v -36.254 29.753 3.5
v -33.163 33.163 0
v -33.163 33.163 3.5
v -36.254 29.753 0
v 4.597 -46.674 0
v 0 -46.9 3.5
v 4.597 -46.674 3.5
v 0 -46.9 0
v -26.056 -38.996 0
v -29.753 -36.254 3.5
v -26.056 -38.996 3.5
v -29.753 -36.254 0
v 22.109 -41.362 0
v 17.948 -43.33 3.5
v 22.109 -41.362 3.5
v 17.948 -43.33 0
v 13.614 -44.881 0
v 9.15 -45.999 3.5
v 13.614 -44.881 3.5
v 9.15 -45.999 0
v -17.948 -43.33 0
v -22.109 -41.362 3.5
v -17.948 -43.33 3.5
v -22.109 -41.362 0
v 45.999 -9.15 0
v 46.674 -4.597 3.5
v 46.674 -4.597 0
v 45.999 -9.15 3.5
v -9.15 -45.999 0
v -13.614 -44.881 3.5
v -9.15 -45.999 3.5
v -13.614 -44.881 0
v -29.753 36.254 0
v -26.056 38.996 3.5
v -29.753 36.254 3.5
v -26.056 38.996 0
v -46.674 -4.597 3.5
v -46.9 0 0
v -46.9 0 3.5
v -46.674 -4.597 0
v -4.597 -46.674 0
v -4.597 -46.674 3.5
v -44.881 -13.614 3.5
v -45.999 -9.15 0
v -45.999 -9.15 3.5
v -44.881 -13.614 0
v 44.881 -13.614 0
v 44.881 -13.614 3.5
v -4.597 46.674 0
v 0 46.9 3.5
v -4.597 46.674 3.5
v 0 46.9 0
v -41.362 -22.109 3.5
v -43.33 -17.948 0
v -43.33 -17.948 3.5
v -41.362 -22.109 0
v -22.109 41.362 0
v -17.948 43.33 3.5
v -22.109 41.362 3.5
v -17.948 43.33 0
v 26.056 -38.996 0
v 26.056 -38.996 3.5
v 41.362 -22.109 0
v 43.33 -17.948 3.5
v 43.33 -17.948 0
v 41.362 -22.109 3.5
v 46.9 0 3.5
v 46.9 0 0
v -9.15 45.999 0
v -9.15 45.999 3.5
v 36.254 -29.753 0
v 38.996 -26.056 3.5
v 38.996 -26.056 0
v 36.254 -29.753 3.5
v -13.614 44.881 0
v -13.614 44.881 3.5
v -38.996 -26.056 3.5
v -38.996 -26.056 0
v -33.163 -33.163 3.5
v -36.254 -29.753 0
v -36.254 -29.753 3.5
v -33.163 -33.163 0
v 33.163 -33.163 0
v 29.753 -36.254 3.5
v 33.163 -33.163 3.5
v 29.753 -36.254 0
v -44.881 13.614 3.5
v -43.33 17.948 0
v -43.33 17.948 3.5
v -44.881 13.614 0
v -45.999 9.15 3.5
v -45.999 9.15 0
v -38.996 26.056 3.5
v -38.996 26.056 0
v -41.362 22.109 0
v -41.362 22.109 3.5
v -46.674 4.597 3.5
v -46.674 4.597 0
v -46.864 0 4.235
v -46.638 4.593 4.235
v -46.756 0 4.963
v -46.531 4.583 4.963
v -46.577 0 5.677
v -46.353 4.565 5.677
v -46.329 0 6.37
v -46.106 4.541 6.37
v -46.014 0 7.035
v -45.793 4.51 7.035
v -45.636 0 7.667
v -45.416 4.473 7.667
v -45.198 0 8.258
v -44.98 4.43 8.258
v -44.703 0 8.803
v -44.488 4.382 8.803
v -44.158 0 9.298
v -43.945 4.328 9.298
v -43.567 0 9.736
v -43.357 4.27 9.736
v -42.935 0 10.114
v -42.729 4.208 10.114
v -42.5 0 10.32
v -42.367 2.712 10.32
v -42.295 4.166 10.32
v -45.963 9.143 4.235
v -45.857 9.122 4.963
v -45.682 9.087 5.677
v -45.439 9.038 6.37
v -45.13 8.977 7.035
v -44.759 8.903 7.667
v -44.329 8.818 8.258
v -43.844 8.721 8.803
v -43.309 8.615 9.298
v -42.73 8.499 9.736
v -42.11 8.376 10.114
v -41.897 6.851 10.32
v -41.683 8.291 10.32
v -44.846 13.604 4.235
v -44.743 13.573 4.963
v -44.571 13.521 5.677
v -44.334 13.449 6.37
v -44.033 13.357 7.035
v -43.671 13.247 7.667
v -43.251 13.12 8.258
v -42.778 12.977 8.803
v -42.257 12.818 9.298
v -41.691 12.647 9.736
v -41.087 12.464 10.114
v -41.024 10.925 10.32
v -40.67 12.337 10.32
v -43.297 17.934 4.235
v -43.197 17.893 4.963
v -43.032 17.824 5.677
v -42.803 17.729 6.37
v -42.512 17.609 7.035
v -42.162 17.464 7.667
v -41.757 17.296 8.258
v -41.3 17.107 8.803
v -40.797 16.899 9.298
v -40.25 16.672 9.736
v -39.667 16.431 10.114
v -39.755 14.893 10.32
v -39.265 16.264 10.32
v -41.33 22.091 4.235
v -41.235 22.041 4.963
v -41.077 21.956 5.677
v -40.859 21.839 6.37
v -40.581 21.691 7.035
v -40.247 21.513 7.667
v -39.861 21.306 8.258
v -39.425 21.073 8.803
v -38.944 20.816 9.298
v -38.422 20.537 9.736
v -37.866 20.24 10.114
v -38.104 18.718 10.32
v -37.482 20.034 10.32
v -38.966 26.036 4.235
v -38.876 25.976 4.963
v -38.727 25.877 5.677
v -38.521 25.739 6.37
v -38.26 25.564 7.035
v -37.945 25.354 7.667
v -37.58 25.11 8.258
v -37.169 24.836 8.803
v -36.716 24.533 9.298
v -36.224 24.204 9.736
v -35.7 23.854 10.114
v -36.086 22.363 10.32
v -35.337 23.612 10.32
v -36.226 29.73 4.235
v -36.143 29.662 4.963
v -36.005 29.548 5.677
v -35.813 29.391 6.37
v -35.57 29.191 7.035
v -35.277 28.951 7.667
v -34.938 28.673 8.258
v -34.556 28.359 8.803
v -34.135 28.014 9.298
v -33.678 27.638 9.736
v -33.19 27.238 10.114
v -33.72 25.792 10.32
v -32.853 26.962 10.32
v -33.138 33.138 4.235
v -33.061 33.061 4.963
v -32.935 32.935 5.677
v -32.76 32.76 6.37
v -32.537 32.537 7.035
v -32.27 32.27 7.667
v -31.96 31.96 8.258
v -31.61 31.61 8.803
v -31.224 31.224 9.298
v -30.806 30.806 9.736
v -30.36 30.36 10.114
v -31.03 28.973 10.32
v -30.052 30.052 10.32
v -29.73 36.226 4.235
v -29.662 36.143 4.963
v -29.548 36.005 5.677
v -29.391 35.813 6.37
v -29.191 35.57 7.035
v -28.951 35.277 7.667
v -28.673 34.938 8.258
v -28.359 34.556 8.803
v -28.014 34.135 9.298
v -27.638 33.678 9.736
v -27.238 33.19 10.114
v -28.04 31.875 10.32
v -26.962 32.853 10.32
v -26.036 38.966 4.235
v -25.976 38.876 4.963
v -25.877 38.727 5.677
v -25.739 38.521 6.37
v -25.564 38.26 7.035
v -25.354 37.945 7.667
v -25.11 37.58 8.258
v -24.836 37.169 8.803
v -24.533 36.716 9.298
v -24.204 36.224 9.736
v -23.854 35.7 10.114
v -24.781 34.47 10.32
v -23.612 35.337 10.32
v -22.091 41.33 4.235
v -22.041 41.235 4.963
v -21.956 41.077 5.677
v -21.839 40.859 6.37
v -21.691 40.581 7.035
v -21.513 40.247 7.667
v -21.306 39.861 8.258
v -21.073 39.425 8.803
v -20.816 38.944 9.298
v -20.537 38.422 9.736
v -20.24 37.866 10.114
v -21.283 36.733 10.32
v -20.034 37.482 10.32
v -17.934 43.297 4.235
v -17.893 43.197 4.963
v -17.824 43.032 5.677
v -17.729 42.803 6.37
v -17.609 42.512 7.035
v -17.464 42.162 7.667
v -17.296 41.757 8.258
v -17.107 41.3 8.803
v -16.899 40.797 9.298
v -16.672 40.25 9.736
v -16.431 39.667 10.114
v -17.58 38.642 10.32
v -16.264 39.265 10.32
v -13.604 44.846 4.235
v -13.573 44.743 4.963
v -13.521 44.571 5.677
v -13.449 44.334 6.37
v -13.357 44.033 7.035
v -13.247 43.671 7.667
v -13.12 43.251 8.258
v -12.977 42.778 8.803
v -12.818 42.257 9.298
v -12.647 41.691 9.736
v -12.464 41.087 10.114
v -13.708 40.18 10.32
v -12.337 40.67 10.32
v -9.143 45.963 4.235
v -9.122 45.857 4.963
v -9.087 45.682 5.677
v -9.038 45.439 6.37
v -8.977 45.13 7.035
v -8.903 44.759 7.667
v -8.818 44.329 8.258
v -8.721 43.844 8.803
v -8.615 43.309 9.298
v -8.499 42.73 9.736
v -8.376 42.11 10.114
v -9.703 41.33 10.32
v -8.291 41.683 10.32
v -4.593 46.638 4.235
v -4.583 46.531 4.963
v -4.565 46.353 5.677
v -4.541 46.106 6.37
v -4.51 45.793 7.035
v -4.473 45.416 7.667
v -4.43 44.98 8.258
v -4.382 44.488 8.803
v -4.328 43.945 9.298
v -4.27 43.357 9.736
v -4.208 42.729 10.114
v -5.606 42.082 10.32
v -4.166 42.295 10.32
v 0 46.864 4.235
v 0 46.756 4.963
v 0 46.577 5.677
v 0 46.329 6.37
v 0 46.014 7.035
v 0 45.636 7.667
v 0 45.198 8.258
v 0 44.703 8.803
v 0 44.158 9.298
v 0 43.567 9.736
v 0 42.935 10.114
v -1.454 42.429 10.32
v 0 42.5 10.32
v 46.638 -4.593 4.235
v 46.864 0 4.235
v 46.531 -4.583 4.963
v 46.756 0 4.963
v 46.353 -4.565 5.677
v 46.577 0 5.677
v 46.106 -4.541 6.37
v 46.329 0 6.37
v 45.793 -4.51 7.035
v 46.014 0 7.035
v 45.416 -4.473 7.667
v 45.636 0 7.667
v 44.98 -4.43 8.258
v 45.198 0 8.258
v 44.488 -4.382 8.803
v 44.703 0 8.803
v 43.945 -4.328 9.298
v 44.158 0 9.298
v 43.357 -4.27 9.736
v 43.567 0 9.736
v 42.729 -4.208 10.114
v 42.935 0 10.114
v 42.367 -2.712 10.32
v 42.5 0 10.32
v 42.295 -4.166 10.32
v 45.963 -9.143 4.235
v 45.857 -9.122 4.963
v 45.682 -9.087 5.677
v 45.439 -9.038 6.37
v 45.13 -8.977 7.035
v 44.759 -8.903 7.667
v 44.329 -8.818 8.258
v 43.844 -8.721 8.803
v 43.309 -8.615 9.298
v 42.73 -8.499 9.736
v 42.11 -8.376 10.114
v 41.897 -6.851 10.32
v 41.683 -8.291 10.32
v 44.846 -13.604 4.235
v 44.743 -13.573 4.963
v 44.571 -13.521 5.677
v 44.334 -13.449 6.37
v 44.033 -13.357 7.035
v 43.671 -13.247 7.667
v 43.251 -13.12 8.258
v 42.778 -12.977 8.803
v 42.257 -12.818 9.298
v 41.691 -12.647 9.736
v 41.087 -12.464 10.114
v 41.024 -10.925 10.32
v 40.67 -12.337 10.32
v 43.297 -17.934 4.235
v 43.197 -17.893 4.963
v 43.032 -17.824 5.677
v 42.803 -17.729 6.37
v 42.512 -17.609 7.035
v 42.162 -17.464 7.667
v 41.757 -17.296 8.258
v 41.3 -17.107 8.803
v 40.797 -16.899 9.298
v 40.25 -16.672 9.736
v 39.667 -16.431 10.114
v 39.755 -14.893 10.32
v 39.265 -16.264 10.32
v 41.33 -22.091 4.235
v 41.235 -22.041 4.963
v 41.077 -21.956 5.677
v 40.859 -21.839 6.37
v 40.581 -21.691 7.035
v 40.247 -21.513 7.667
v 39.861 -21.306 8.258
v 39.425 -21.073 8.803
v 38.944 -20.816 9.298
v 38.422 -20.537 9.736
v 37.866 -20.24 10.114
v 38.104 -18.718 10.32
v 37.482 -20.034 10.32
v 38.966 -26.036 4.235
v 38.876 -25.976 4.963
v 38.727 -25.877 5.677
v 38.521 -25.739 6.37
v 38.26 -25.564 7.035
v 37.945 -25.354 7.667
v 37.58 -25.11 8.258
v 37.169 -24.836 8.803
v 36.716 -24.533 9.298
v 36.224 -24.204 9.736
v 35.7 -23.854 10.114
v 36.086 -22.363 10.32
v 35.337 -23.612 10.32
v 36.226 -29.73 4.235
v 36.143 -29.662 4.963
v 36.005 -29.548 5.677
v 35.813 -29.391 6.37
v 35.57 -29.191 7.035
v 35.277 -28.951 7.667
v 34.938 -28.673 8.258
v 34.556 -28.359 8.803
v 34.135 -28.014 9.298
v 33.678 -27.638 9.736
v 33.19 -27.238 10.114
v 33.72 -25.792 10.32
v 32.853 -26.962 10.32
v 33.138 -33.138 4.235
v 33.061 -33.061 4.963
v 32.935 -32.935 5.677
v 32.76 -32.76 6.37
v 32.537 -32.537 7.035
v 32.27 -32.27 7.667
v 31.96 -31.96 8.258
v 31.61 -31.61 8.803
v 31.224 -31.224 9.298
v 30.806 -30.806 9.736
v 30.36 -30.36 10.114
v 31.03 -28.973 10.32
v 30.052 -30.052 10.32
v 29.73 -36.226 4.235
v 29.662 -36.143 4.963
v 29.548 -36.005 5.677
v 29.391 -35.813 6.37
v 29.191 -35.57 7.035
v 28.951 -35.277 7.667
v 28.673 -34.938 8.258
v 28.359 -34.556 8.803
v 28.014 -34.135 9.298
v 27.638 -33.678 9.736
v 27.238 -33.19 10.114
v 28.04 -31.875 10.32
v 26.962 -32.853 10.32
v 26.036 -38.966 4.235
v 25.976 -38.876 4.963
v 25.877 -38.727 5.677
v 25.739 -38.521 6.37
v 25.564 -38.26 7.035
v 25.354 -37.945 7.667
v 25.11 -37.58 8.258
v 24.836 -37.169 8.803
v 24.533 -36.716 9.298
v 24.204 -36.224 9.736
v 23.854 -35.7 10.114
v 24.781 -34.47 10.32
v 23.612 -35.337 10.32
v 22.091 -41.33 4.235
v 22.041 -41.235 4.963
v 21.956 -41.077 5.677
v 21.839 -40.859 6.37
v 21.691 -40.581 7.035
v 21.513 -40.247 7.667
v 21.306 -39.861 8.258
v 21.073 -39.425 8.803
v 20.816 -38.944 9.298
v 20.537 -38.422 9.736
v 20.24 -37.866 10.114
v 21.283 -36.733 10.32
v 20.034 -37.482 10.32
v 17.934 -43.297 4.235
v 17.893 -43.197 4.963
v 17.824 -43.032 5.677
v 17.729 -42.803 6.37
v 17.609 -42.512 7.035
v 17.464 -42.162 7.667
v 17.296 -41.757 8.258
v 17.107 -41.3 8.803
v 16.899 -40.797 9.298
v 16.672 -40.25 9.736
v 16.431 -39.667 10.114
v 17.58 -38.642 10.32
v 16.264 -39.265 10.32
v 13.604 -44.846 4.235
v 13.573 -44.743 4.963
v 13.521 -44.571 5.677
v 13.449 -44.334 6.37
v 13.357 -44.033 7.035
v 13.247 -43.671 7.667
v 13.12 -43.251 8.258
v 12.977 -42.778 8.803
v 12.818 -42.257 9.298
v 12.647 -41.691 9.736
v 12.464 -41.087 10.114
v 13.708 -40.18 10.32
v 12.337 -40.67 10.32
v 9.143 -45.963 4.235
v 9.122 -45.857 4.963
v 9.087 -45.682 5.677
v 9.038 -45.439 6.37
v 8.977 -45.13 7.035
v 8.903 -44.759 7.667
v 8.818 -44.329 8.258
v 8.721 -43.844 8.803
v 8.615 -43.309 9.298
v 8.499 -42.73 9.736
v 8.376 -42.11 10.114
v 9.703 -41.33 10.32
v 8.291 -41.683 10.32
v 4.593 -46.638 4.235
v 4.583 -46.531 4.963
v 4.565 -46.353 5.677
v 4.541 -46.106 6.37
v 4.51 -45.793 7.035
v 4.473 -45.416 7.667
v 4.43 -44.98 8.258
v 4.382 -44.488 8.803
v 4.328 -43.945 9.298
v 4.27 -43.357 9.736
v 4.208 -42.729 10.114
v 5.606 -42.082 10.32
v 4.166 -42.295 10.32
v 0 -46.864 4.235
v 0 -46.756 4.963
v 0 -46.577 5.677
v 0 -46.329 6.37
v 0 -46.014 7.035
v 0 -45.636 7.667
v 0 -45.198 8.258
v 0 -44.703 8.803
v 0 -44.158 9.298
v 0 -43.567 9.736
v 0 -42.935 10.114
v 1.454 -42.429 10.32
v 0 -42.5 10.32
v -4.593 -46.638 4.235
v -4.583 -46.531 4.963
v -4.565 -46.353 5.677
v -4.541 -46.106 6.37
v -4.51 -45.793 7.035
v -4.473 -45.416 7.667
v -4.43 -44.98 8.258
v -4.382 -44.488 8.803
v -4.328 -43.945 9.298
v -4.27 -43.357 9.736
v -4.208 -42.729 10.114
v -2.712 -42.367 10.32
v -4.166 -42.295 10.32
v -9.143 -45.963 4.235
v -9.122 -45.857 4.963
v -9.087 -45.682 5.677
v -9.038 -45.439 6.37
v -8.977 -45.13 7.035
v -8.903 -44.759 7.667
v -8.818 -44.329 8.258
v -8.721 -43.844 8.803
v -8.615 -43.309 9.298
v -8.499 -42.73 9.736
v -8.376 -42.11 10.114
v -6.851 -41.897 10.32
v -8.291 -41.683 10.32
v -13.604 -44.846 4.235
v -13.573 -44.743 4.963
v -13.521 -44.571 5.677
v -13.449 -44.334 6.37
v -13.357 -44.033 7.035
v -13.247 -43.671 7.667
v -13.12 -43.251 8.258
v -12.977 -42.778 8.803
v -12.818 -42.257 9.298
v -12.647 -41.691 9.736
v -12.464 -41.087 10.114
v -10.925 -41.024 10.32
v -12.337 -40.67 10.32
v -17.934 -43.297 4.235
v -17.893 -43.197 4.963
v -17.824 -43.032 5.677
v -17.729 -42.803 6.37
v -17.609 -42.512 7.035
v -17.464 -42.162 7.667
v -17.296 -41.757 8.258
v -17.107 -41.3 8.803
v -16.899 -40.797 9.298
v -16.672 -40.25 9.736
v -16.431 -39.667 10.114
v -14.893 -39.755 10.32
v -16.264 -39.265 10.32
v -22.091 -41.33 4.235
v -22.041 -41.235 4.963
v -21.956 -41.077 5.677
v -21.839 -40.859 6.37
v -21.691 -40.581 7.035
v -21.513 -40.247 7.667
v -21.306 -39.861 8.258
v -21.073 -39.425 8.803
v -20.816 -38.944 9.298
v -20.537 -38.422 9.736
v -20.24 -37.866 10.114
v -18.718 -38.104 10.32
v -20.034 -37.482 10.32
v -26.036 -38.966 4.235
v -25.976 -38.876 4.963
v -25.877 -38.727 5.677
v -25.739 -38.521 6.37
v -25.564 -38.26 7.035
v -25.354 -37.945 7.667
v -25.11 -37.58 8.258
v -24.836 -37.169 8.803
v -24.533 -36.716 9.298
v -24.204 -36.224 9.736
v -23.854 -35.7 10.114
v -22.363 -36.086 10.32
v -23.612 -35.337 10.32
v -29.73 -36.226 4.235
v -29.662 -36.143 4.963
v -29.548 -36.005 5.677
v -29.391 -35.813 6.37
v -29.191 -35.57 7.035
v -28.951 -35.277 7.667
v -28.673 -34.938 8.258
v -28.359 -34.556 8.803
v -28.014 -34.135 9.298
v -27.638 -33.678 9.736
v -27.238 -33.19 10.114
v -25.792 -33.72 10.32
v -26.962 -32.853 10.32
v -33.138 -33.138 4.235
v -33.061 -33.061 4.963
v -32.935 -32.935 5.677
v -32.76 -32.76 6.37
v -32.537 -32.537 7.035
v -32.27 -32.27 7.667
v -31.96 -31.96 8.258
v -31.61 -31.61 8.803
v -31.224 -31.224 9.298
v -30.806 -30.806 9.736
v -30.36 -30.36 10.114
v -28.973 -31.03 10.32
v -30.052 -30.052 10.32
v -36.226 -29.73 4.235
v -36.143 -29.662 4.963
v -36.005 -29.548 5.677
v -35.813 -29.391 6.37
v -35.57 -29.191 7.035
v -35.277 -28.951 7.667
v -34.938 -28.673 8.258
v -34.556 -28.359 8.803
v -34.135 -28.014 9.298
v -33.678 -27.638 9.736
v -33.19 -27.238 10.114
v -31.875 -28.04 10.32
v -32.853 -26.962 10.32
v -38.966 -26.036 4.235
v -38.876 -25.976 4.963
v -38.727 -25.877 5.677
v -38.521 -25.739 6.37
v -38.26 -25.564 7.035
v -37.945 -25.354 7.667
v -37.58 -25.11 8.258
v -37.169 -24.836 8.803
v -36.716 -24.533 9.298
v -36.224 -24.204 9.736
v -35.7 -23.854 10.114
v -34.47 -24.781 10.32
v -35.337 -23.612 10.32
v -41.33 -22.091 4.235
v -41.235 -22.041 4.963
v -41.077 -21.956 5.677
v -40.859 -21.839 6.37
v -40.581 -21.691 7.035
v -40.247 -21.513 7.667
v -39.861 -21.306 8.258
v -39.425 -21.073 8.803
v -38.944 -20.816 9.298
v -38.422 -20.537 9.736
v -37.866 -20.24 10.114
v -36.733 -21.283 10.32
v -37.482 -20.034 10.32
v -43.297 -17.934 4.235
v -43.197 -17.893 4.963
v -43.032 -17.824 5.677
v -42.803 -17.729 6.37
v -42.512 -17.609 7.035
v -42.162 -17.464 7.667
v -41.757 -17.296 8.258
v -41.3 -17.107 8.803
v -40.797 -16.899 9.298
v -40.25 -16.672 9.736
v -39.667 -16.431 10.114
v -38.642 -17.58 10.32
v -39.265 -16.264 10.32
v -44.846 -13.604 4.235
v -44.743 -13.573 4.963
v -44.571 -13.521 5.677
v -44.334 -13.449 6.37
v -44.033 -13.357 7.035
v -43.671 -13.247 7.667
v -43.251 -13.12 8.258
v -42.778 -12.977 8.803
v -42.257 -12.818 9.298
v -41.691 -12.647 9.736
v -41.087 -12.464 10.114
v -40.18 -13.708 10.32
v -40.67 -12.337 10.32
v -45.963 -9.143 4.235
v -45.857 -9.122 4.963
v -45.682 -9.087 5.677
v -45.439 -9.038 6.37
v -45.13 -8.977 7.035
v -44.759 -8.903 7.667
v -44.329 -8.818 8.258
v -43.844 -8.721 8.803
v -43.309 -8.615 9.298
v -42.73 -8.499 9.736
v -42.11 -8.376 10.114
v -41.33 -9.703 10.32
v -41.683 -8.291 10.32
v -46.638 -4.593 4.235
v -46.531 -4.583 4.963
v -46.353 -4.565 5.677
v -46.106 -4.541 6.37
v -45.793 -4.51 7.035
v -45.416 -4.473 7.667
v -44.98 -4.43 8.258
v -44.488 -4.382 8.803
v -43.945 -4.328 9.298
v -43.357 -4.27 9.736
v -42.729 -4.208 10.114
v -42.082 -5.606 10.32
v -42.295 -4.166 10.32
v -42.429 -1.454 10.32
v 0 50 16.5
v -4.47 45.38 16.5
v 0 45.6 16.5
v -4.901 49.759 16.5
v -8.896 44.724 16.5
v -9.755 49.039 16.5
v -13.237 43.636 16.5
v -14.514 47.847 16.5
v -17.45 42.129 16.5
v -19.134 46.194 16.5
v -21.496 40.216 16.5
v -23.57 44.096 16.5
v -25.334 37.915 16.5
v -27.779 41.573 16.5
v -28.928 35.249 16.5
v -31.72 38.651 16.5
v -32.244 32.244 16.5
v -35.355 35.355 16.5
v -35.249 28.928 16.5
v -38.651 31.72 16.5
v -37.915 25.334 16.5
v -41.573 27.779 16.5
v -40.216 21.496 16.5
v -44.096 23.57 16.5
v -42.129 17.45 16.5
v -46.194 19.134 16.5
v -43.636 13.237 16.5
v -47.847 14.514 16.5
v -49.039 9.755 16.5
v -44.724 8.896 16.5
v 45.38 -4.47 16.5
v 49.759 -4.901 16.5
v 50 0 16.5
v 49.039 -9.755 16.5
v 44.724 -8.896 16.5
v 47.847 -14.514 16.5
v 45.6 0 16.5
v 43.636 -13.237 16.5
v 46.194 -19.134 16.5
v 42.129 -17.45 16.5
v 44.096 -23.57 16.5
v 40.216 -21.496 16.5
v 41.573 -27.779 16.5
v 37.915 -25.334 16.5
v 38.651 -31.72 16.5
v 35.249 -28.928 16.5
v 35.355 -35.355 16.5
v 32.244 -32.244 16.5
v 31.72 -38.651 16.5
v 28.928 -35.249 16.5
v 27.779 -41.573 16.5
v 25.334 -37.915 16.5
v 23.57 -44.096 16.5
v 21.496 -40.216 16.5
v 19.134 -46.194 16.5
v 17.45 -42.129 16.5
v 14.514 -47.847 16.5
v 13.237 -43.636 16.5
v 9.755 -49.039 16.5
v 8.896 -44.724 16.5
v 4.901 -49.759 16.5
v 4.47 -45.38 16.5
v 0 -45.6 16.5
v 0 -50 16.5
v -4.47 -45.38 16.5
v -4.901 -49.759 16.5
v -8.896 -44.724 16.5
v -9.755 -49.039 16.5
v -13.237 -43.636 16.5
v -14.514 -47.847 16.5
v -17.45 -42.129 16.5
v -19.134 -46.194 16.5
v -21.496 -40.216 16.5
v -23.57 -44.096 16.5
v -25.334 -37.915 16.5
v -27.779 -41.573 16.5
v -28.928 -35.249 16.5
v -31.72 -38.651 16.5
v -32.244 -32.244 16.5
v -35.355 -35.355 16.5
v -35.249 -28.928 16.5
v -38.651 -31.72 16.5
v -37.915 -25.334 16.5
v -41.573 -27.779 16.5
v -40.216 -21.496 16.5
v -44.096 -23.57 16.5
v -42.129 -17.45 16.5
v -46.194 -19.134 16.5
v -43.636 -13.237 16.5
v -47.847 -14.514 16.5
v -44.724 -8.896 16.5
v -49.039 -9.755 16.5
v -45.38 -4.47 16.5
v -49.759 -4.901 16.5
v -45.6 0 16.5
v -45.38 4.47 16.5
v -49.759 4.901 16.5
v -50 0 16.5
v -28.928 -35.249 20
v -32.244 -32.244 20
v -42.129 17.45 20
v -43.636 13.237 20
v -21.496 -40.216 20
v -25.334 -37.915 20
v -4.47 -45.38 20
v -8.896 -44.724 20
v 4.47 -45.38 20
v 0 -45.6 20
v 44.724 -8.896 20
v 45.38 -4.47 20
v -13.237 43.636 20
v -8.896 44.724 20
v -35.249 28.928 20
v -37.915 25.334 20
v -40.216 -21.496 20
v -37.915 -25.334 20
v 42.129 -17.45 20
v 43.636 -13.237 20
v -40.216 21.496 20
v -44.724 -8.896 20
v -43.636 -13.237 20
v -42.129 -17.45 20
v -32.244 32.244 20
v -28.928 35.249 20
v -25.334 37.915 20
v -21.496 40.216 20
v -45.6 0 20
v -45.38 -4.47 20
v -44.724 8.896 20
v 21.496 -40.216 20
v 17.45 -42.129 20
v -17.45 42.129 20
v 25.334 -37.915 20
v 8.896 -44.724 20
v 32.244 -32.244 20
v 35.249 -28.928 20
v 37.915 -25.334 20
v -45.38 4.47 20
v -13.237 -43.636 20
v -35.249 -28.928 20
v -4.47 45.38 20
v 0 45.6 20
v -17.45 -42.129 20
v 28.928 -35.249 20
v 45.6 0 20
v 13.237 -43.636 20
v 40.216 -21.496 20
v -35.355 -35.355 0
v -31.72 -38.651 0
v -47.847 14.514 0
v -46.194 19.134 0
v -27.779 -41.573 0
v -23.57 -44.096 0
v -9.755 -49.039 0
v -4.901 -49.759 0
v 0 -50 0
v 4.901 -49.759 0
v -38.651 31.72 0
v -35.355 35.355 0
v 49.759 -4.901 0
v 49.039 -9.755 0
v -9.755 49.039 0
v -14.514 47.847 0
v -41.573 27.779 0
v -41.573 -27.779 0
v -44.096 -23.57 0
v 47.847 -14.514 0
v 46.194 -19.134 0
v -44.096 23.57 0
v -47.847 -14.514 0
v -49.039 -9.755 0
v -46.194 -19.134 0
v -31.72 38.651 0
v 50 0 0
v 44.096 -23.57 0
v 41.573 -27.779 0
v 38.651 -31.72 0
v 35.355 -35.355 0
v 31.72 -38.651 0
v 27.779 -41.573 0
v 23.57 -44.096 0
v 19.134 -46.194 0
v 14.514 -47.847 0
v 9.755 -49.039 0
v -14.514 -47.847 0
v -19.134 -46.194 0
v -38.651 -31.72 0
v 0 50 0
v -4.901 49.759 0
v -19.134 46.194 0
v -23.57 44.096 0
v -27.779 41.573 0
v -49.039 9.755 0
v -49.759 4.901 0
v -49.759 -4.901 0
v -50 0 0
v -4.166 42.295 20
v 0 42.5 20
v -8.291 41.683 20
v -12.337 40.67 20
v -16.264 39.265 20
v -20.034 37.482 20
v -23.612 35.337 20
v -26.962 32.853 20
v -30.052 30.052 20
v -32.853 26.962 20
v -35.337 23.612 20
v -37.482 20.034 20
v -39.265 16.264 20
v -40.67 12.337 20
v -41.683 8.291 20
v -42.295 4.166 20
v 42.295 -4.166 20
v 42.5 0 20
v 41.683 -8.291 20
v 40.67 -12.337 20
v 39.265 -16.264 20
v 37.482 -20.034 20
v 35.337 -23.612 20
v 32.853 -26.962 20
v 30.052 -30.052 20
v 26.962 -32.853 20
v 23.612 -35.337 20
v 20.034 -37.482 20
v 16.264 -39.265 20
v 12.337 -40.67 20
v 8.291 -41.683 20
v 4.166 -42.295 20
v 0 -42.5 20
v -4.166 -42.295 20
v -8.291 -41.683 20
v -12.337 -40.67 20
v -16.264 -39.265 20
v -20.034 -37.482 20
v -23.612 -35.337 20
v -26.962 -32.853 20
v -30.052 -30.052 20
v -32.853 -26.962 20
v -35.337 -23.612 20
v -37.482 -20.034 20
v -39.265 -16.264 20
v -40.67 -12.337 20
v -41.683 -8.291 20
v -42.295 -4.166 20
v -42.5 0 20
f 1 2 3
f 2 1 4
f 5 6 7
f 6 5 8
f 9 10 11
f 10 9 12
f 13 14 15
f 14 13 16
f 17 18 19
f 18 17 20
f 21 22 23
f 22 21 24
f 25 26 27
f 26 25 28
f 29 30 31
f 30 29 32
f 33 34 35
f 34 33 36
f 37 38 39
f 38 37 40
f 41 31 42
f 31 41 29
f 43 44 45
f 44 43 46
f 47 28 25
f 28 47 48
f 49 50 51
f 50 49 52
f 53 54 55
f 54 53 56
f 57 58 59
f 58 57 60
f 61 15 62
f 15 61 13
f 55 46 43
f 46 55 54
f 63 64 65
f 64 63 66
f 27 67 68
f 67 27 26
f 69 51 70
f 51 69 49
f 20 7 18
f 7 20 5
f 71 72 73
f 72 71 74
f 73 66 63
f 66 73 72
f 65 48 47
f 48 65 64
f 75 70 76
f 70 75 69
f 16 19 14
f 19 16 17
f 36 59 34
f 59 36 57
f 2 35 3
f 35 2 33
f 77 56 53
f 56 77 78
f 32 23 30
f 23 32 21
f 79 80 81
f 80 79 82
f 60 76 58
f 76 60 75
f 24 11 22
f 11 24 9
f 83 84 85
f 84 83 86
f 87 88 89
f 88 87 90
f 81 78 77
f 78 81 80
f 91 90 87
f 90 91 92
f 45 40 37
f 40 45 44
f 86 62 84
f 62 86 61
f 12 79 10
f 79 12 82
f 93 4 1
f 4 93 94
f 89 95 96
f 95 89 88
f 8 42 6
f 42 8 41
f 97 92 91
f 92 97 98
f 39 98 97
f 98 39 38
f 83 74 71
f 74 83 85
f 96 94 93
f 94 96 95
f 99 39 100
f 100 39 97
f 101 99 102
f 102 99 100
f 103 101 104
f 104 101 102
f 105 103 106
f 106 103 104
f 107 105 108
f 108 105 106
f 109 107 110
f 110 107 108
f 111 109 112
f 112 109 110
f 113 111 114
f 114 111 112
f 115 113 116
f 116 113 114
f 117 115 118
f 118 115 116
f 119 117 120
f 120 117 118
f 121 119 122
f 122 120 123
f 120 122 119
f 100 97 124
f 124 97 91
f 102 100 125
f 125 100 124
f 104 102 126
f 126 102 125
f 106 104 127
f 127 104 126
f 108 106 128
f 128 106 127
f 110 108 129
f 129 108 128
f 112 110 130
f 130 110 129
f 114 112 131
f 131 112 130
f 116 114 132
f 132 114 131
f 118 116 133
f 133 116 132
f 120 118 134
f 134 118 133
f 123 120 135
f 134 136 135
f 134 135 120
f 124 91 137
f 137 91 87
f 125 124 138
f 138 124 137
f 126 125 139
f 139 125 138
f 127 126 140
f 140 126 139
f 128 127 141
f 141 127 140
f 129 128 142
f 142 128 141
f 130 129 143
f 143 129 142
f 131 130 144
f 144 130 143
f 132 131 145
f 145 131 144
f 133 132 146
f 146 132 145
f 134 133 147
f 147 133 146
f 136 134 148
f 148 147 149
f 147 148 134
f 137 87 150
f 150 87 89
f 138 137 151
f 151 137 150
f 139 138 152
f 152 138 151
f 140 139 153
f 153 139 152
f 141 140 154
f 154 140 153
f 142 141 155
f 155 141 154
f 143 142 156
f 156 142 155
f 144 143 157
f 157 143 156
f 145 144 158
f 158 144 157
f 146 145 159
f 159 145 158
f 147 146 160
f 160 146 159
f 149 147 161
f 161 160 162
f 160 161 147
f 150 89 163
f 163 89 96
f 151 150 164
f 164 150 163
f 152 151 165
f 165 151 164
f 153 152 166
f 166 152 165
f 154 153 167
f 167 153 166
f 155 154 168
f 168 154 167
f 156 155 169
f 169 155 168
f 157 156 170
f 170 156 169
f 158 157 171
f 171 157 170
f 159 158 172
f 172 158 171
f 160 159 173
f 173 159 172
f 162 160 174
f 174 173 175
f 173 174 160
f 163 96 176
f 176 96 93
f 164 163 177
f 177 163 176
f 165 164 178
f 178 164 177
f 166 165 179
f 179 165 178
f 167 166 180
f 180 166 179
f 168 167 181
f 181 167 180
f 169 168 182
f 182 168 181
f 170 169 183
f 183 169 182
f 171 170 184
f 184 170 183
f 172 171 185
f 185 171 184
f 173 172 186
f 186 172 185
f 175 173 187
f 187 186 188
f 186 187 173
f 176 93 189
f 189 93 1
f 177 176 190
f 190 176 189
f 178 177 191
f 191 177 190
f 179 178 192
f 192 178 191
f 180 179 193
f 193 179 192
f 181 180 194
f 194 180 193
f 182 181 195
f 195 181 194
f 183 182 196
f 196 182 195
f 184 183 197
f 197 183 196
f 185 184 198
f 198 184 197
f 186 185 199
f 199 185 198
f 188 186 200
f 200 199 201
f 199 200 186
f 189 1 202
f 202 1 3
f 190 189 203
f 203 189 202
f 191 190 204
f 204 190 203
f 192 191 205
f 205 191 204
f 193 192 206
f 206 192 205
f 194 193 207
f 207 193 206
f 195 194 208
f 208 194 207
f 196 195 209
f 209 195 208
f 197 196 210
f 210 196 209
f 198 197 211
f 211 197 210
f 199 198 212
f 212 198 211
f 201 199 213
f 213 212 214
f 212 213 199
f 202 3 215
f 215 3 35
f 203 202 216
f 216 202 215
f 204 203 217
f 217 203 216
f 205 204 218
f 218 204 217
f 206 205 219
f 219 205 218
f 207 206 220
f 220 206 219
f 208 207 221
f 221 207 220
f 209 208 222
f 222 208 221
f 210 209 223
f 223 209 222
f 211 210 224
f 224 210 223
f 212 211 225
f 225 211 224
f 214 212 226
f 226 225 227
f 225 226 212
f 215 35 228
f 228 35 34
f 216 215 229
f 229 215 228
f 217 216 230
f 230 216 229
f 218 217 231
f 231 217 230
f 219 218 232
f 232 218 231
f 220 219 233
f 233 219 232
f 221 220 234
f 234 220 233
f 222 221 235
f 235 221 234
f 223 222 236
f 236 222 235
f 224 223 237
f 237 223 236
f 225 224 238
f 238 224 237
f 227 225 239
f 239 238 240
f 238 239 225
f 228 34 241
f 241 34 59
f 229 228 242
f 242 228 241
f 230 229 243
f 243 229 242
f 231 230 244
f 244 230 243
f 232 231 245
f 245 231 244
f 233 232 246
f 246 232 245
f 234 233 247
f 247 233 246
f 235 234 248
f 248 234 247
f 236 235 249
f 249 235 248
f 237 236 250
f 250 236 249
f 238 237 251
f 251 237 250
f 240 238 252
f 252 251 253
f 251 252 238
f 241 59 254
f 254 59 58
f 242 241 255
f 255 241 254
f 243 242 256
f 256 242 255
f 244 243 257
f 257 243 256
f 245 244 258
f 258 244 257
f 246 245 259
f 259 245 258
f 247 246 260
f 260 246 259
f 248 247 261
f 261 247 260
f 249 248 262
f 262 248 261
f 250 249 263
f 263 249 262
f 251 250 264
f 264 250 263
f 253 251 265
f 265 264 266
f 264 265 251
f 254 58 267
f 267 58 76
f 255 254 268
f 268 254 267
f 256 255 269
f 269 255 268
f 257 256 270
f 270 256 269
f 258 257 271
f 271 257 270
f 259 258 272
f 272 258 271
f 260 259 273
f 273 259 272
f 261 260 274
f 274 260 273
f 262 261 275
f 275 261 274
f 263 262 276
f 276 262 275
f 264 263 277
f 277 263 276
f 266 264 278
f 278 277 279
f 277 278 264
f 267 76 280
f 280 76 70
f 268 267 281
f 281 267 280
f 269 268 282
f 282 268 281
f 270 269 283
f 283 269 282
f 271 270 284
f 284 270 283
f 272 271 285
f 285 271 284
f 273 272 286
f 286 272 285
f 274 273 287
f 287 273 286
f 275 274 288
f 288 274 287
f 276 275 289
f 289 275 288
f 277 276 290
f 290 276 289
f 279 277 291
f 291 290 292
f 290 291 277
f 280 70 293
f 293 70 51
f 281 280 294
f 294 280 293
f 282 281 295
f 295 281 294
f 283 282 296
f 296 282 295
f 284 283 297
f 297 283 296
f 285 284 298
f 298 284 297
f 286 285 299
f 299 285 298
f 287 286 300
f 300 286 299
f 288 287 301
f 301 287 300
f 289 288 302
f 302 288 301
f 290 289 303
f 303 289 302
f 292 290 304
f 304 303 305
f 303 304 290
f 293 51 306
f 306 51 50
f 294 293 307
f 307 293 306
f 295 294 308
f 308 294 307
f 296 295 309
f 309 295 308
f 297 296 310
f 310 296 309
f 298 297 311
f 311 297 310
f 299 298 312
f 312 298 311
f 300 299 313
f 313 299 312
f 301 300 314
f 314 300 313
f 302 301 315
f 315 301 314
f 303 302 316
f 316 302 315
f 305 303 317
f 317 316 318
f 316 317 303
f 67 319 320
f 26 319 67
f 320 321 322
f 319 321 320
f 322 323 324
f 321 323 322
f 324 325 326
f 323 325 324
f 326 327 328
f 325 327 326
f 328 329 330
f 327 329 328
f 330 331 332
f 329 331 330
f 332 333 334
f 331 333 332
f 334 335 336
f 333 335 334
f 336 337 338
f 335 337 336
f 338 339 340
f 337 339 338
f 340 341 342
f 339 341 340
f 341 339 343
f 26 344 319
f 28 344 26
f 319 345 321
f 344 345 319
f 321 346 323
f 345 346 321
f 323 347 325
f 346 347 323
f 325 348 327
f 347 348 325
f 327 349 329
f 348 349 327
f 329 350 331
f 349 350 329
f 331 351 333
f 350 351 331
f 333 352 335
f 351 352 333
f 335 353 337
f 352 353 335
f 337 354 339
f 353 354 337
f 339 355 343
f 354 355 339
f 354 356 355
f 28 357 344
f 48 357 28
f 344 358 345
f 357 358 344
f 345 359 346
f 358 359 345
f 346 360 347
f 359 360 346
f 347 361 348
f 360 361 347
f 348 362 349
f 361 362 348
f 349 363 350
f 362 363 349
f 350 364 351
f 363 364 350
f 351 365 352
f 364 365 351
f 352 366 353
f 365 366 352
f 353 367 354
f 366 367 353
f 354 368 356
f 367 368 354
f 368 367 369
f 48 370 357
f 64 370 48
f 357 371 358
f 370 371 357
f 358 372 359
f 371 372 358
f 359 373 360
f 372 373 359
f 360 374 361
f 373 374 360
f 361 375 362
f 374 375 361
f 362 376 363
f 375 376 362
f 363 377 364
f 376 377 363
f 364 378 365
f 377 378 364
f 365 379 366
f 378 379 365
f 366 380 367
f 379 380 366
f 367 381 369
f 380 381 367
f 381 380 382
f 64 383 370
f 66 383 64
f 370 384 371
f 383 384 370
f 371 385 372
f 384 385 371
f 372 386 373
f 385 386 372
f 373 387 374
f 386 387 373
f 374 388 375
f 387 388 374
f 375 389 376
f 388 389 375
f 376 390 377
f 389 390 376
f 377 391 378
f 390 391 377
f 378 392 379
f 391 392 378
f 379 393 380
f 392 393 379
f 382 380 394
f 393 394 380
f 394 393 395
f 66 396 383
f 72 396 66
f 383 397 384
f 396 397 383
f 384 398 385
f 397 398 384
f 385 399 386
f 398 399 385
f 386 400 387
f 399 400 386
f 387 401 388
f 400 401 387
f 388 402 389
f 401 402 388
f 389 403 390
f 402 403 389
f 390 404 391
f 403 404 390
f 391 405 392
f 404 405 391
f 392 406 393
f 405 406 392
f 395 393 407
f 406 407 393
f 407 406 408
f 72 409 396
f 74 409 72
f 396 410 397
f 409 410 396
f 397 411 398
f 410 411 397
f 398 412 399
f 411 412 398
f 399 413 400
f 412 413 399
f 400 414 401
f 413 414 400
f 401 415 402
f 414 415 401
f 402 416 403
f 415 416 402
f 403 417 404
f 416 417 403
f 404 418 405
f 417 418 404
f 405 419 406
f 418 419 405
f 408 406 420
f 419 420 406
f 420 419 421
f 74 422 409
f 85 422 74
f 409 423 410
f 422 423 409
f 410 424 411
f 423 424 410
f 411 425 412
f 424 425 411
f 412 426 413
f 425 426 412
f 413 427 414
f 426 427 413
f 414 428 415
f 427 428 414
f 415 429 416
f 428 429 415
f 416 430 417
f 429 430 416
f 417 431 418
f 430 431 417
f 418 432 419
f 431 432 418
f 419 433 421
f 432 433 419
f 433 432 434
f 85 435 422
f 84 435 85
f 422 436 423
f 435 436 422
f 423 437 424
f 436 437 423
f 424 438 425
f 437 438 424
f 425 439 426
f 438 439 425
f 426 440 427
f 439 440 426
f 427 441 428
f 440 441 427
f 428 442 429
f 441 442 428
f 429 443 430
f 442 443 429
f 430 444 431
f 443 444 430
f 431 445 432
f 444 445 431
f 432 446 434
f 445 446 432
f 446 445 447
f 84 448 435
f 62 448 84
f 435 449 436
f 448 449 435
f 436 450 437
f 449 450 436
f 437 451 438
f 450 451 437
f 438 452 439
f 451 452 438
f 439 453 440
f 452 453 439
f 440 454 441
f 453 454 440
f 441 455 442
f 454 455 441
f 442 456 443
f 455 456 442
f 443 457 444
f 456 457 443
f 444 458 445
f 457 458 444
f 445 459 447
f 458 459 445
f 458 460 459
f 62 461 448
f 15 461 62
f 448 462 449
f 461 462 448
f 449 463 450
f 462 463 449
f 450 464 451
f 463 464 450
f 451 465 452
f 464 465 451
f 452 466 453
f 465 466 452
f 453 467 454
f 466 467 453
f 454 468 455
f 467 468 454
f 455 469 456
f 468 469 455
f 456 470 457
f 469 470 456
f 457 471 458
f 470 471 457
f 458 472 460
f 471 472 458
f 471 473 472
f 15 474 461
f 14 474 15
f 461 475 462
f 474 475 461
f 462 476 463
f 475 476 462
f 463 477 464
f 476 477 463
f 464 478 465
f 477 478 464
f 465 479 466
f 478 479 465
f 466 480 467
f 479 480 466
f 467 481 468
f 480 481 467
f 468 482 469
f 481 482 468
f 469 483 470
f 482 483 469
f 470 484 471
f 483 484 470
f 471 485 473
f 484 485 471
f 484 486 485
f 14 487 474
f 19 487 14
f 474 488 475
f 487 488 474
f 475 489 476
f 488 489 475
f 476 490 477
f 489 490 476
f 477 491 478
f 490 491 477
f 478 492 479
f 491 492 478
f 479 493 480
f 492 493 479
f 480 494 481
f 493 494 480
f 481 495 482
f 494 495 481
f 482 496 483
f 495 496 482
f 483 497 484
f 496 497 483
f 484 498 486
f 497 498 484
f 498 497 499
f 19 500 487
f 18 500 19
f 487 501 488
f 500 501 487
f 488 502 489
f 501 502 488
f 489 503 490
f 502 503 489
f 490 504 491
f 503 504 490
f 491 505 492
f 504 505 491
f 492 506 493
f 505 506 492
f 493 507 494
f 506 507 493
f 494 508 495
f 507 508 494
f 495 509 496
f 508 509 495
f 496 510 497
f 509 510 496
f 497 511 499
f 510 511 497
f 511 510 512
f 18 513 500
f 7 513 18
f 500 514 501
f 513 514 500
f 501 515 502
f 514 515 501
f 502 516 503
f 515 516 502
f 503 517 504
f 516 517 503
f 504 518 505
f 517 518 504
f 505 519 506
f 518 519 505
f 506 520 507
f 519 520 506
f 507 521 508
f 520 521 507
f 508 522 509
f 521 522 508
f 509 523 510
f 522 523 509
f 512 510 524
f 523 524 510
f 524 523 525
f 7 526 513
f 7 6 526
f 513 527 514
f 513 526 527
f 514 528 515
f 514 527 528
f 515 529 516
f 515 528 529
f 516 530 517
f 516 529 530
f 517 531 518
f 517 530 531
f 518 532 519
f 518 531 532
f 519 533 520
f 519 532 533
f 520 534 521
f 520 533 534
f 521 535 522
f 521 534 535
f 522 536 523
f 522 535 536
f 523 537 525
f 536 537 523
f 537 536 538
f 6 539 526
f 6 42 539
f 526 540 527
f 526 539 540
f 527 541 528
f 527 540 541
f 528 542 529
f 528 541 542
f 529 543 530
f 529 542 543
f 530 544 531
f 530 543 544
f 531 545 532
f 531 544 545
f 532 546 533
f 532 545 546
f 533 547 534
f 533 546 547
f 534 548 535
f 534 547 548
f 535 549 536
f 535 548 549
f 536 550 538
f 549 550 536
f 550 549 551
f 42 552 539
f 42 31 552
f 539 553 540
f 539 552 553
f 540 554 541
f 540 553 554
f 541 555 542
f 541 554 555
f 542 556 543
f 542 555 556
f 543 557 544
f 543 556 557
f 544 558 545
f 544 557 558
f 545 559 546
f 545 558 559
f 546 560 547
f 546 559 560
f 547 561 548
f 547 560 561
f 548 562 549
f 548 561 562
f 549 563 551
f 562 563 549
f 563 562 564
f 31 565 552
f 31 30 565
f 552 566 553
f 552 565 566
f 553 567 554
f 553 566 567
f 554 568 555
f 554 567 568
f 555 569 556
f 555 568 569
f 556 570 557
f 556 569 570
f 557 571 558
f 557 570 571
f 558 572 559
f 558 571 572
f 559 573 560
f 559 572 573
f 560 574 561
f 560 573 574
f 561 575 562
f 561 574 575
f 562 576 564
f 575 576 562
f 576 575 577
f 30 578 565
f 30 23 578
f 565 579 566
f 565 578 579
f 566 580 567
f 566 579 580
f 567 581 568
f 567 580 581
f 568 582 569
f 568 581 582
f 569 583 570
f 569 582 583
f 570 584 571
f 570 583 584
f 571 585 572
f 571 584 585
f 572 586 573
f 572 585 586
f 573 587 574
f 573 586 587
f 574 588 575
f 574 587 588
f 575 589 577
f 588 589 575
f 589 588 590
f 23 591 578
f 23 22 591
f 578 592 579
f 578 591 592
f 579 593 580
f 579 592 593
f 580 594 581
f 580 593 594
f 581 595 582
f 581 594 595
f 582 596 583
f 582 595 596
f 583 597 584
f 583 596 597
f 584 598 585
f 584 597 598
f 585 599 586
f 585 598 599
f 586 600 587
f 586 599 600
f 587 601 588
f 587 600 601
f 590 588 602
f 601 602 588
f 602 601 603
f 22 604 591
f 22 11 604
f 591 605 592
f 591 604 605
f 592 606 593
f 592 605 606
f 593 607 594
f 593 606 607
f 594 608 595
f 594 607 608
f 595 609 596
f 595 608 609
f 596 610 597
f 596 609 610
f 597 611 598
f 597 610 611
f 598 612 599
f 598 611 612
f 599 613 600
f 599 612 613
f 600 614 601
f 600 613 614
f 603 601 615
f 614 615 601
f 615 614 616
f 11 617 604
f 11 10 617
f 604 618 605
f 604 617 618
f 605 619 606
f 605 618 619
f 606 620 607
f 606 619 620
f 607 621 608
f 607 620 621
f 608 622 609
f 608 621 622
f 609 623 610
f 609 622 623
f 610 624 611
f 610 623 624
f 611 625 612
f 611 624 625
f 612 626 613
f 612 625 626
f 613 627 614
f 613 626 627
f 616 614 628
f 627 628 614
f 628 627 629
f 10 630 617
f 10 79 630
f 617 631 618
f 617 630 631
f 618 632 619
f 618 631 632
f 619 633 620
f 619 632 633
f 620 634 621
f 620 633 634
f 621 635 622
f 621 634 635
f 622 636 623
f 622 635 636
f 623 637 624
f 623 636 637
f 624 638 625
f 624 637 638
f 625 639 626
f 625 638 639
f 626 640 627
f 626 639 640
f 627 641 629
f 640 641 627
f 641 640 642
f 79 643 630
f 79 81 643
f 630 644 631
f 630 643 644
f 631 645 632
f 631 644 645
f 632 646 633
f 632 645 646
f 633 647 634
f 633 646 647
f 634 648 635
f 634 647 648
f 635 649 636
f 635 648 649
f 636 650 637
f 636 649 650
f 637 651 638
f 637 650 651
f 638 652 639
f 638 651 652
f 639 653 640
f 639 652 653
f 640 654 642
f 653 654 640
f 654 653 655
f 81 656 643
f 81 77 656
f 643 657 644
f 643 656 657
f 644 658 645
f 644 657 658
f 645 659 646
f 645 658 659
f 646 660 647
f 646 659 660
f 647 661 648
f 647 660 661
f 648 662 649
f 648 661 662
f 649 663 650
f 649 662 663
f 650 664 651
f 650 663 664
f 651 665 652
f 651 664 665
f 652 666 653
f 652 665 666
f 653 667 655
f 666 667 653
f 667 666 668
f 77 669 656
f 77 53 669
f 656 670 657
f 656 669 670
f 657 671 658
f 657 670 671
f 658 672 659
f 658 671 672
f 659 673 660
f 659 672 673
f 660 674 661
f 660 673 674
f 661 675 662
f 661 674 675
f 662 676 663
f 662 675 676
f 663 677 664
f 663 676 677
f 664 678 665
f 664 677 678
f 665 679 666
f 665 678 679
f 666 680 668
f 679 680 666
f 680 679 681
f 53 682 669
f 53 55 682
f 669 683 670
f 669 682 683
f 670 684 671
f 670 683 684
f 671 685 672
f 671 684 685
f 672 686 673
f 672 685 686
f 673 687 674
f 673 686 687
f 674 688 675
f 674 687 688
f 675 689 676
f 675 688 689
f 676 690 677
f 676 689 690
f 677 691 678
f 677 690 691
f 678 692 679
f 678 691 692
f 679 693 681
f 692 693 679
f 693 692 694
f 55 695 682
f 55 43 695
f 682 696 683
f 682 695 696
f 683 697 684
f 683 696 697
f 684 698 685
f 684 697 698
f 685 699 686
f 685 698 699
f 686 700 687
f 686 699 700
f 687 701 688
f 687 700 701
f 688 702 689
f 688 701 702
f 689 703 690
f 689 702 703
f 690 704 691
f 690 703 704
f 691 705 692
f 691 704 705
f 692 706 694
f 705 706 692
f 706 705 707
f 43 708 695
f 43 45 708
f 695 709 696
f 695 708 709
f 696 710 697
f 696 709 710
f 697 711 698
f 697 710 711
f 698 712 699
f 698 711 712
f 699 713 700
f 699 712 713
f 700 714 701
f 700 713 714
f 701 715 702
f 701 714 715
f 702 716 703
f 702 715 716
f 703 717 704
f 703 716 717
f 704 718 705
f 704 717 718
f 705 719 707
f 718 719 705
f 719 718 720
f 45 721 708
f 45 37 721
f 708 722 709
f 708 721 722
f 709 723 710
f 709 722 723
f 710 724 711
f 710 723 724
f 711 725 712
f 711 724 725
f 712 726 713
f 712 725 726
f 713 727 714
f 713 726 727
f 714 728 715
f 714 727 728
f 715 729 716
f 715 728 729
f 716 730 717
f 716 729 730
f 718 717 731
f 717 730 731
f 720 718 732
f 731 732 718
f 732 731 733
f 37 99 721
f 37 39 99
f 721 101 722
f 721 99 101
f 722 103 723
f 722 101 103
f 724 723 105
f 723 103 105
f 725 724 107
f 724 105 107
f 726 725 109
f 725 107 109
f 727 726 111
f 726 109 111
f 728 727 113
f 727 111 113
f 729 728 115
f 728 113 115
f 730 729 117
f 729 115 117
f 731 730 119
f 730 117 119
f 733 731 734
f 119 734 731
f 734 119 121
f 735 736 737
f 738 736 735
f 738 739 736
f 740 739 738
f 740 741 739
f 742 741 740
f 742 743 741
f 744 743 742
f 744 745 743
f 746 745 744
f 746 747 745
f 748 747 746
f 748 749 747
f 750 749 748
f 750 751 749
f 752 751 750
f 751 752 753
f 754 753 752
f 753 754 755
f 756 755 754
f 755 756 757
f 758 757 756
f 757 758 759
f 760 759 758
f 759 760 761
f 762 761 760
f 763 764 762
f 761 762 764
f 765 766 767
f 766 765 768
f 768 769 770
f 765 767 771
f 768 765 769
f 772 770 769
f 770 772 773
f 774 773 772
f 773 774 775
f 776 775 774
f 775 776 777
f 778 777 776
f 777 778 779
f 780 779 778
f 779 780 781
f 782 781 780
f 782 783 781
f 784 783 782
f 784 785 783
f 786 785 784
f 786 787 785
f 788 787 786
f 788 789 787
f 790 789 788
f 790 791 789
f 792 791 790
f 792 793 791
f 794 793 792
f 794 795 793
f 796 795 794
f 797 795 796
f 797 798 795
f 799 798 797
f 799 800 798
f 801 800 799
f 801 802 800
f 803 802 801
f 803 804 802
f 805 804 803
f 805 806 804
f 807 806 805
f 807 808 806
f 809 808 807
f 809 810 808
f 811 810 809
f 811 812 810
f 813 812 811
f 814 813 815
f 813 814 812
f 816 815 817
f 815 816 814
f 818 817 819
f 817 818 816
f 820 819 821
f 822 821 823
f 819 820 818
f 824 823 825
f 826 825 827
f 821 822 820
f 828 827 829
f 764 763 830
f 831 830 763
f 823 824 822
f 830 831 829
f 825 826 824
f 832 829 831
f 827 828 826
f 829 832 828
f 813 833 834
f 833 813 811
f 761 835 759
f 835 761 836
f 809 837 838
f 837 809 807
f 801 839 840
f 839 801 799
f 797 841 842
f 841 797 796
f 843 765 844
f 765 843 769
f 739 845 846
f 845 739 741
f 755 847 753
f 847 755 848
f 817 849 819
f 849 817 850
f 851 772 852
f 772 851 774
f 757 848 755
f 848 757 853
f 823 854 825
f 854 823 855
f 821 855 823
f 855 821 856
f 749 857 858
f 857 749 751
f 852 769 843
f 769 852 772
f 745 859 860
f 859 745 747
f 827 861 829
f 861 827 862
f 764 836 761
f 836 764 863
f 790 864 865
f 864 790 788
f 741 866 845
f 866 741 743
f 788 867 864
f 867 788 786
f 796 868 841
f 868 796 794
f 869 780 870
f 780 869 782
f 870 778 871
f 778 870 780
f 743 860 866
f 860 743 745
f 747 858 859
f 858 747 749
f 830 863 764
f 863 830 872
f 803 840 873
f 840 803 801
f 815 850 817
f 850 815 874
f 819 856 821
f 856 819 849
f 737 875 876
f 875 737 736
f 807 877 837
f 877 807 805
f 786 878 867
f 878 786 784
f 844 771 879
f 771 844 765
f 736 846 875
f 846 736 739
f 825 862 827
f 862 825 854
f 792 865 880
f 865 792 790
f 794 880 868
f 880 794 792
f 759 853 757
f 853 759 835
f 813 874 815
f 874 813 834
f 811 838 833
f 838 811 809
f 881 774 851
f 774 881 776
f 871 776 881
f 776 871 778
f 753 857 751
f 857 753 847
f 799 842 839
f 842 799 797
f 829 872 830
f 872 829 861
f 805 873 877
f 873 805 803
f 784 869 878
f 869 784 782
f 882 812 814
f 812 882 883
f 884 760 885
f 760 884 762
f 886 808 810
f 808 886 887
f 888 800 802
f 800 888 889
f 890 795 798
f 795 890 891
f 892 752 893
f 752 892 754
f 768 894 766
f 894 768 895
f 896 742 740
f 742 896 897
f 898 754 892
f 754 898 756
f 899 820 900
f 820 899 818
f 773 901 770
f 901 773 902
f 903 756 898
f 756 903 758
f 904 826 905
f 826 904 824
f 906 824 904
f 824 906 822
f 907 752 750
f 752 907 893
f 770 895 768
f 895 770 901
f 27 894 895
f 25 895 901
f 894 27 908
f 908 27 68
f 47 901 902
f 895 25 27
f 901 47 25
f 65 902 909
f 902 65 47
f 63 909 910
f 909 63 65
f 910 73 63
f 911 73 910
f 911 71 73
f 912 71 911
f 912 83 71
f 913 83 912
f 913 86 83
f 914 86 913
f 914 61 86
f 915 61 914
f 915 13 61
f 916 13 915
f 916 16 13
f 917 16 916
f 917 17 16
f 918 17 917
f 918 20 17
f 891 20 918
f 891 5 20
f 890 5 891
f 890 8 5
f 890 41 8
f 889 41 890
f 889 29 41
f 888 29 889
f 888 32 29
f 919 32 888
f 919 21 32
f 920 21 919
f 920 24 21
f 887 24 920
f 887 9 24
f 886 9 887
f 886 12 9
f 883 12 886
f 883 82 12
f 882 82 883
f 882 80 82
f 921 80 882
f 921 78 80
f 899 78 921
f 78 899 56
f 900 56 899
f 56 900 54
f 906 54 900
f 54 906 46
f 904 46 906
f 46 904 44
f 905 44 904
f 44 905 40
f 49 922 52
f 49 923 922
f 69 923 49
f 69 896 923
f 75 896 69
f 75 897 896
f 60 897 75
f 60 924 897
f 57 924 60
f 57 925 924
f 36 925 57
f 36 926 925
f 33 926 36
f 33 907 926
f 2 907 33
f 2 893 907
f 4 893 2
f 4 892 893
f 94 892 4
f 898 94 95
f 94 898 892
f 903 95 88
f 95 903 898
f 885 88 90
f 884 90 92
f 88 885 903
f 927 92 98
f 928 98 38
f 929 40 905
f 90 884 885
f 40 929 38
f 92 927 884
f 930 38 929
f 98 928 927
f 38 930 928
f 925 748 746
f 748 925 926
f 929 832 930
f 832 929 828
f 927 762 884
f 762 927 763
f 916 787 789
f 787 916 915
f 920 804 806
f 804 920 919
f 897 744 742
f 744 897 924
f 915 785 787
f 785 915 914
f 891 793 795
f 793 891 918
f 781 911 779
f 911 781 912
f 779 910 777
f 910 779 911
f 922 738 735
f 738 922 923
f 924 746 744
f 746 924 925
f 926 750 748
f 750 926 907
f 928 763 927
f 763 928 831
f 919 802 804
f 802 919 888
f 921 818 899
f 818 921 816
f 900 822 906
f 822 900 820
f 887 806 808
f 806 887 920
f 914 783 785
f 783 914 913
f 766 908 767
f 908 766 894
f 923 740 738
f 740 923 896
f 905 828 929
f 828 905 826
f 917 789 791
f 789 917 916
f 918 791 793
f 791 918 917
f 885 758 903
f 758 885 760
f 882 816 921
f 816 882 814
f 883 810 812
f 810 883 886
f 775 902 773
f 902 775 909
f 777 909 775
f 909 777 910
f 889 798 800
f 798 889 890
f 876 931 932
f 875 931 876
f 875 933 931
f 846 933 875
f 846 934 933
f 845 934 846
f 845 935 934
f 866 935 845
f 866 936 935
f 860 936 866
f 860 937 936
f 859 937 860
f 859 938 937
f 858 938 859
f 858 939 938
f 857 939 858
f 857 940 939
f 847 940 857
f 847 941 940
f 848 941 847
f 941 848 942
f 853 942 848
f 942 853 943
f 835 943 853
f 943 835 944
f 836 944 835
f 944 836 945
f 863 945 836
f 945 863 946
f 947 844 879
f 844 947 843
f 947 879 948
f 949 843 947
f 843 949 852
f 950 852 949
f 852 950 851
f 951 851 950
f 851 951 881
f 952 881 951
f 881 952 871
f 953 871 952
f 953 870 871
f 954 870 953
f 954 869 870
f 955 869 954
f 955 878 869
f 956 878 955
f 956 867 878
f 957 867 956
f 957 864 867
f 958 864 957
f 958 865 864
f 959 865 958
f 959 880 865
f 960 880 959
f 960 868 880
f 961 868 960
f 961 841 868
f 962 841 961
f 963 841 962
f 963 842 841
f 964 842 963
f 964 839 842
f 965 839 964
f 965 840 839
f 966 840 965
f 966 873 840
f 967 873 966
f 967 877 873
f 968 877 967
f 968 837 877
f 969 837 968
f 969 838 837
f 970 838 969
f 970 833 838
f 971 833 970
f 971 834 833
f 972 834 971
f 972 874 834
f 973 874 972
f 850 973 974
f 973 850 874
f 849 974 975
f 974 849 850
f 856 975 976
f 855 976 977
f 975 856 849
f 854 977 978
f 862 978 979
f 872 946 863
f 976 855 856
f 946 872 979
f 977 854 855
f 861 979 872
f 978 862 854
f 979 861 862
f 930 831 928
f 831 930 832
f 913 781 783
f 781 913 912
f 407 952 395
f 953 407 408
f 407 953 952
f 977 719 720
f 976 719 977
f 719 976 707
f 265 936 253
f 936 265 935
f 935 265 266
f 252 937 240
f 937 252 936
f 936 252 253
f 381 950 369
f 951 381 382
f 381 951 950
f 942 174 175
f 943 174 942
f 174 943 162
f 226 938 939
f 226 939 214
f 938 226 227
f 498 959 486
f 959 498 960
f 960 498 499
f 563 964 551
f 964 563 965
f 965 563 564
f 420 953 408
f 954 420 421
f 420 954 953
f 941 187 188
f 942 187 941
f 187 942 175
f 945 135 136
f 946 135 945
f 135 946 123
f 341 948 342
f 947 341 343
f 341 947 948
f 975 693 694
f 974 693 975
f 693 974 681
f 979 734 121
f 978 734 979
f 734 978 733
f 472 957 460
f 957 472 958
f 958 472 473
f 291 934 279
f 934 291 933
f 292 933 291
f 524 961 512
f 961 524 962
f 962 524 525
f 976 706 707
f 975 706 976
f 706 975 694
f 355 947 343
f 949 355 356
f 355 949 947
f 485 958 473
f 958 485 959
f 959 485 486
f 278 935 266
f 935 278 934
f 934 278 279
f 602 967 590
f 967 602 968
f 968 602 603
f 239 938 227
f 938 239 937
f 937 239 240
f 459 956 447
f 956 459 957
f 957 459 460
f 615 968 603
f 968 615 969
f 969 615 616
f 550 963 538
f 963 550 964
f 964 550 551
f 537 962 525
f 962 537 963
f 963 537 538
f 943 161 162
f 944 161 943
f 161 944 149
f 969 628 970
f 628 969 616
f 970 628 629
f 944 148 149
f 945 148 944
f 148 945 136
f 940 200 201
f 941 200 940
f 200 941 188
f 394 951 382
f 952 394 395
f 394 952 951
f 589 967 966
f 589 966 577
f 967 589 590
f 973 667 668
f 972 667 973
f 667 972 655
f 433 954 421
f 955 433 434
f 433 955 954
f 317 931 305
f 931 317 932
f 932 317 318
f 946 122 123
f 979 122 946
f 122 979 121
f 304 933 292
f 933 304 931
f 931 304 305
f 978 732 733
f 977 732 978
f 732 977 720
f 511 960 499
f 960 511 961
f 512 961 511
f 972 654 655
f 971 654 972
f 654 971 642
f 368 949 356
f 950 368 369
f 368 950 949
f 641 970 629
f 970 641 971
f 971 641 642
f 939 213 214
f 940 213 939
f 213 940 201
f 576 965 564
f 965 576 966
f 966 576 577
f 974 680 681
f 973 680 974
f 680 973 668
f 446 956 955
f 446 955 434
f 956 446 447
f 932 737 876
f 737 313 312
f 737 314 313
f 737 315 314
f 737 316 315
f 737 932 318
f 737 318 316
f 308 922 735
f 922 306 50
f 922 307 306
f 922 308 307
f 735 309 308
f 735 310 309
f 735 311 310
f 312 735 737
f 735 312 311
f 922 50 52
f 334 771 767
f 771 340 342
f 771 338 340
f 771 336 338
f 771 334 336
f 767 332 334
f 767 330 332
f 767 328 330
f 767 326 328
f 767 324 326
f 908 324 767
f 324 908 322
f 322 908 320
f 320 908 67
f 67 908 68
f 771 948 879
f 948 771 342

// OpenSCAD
difference(){
    cylinder(h=20, r=50.0, $fn=64);
    translate(v=[0, 0, -10.0]){
        cylinder(h=40, r=42.5, $fn=64);
    };
    union(){
        translate(v=[0, 0, -1]){
            cylinder(h=4.5, r=46.9, $fn=64);
        };
        translate(v=[0, 0, 3.5]){
            rotate_extrude(convexity=10, $fn=64){
                translate(v=[39.4, 0, 0]){
                    circle(r=7.5, $fn=64);
                };
            };
        };
    };
    translate(v=[0, 0, 16.5]){
        difference(){
            cylinder(h=4.5, r=51.0, $fn=64);
            translate(v=[0, 0, -1]){
                cylinder(h=5.5, r=45.6, $fn=64);
            };
        };
    };
    translate(v=[0, 0, -1]){
        cube(size=[100, 100, 100]);
    };
};
